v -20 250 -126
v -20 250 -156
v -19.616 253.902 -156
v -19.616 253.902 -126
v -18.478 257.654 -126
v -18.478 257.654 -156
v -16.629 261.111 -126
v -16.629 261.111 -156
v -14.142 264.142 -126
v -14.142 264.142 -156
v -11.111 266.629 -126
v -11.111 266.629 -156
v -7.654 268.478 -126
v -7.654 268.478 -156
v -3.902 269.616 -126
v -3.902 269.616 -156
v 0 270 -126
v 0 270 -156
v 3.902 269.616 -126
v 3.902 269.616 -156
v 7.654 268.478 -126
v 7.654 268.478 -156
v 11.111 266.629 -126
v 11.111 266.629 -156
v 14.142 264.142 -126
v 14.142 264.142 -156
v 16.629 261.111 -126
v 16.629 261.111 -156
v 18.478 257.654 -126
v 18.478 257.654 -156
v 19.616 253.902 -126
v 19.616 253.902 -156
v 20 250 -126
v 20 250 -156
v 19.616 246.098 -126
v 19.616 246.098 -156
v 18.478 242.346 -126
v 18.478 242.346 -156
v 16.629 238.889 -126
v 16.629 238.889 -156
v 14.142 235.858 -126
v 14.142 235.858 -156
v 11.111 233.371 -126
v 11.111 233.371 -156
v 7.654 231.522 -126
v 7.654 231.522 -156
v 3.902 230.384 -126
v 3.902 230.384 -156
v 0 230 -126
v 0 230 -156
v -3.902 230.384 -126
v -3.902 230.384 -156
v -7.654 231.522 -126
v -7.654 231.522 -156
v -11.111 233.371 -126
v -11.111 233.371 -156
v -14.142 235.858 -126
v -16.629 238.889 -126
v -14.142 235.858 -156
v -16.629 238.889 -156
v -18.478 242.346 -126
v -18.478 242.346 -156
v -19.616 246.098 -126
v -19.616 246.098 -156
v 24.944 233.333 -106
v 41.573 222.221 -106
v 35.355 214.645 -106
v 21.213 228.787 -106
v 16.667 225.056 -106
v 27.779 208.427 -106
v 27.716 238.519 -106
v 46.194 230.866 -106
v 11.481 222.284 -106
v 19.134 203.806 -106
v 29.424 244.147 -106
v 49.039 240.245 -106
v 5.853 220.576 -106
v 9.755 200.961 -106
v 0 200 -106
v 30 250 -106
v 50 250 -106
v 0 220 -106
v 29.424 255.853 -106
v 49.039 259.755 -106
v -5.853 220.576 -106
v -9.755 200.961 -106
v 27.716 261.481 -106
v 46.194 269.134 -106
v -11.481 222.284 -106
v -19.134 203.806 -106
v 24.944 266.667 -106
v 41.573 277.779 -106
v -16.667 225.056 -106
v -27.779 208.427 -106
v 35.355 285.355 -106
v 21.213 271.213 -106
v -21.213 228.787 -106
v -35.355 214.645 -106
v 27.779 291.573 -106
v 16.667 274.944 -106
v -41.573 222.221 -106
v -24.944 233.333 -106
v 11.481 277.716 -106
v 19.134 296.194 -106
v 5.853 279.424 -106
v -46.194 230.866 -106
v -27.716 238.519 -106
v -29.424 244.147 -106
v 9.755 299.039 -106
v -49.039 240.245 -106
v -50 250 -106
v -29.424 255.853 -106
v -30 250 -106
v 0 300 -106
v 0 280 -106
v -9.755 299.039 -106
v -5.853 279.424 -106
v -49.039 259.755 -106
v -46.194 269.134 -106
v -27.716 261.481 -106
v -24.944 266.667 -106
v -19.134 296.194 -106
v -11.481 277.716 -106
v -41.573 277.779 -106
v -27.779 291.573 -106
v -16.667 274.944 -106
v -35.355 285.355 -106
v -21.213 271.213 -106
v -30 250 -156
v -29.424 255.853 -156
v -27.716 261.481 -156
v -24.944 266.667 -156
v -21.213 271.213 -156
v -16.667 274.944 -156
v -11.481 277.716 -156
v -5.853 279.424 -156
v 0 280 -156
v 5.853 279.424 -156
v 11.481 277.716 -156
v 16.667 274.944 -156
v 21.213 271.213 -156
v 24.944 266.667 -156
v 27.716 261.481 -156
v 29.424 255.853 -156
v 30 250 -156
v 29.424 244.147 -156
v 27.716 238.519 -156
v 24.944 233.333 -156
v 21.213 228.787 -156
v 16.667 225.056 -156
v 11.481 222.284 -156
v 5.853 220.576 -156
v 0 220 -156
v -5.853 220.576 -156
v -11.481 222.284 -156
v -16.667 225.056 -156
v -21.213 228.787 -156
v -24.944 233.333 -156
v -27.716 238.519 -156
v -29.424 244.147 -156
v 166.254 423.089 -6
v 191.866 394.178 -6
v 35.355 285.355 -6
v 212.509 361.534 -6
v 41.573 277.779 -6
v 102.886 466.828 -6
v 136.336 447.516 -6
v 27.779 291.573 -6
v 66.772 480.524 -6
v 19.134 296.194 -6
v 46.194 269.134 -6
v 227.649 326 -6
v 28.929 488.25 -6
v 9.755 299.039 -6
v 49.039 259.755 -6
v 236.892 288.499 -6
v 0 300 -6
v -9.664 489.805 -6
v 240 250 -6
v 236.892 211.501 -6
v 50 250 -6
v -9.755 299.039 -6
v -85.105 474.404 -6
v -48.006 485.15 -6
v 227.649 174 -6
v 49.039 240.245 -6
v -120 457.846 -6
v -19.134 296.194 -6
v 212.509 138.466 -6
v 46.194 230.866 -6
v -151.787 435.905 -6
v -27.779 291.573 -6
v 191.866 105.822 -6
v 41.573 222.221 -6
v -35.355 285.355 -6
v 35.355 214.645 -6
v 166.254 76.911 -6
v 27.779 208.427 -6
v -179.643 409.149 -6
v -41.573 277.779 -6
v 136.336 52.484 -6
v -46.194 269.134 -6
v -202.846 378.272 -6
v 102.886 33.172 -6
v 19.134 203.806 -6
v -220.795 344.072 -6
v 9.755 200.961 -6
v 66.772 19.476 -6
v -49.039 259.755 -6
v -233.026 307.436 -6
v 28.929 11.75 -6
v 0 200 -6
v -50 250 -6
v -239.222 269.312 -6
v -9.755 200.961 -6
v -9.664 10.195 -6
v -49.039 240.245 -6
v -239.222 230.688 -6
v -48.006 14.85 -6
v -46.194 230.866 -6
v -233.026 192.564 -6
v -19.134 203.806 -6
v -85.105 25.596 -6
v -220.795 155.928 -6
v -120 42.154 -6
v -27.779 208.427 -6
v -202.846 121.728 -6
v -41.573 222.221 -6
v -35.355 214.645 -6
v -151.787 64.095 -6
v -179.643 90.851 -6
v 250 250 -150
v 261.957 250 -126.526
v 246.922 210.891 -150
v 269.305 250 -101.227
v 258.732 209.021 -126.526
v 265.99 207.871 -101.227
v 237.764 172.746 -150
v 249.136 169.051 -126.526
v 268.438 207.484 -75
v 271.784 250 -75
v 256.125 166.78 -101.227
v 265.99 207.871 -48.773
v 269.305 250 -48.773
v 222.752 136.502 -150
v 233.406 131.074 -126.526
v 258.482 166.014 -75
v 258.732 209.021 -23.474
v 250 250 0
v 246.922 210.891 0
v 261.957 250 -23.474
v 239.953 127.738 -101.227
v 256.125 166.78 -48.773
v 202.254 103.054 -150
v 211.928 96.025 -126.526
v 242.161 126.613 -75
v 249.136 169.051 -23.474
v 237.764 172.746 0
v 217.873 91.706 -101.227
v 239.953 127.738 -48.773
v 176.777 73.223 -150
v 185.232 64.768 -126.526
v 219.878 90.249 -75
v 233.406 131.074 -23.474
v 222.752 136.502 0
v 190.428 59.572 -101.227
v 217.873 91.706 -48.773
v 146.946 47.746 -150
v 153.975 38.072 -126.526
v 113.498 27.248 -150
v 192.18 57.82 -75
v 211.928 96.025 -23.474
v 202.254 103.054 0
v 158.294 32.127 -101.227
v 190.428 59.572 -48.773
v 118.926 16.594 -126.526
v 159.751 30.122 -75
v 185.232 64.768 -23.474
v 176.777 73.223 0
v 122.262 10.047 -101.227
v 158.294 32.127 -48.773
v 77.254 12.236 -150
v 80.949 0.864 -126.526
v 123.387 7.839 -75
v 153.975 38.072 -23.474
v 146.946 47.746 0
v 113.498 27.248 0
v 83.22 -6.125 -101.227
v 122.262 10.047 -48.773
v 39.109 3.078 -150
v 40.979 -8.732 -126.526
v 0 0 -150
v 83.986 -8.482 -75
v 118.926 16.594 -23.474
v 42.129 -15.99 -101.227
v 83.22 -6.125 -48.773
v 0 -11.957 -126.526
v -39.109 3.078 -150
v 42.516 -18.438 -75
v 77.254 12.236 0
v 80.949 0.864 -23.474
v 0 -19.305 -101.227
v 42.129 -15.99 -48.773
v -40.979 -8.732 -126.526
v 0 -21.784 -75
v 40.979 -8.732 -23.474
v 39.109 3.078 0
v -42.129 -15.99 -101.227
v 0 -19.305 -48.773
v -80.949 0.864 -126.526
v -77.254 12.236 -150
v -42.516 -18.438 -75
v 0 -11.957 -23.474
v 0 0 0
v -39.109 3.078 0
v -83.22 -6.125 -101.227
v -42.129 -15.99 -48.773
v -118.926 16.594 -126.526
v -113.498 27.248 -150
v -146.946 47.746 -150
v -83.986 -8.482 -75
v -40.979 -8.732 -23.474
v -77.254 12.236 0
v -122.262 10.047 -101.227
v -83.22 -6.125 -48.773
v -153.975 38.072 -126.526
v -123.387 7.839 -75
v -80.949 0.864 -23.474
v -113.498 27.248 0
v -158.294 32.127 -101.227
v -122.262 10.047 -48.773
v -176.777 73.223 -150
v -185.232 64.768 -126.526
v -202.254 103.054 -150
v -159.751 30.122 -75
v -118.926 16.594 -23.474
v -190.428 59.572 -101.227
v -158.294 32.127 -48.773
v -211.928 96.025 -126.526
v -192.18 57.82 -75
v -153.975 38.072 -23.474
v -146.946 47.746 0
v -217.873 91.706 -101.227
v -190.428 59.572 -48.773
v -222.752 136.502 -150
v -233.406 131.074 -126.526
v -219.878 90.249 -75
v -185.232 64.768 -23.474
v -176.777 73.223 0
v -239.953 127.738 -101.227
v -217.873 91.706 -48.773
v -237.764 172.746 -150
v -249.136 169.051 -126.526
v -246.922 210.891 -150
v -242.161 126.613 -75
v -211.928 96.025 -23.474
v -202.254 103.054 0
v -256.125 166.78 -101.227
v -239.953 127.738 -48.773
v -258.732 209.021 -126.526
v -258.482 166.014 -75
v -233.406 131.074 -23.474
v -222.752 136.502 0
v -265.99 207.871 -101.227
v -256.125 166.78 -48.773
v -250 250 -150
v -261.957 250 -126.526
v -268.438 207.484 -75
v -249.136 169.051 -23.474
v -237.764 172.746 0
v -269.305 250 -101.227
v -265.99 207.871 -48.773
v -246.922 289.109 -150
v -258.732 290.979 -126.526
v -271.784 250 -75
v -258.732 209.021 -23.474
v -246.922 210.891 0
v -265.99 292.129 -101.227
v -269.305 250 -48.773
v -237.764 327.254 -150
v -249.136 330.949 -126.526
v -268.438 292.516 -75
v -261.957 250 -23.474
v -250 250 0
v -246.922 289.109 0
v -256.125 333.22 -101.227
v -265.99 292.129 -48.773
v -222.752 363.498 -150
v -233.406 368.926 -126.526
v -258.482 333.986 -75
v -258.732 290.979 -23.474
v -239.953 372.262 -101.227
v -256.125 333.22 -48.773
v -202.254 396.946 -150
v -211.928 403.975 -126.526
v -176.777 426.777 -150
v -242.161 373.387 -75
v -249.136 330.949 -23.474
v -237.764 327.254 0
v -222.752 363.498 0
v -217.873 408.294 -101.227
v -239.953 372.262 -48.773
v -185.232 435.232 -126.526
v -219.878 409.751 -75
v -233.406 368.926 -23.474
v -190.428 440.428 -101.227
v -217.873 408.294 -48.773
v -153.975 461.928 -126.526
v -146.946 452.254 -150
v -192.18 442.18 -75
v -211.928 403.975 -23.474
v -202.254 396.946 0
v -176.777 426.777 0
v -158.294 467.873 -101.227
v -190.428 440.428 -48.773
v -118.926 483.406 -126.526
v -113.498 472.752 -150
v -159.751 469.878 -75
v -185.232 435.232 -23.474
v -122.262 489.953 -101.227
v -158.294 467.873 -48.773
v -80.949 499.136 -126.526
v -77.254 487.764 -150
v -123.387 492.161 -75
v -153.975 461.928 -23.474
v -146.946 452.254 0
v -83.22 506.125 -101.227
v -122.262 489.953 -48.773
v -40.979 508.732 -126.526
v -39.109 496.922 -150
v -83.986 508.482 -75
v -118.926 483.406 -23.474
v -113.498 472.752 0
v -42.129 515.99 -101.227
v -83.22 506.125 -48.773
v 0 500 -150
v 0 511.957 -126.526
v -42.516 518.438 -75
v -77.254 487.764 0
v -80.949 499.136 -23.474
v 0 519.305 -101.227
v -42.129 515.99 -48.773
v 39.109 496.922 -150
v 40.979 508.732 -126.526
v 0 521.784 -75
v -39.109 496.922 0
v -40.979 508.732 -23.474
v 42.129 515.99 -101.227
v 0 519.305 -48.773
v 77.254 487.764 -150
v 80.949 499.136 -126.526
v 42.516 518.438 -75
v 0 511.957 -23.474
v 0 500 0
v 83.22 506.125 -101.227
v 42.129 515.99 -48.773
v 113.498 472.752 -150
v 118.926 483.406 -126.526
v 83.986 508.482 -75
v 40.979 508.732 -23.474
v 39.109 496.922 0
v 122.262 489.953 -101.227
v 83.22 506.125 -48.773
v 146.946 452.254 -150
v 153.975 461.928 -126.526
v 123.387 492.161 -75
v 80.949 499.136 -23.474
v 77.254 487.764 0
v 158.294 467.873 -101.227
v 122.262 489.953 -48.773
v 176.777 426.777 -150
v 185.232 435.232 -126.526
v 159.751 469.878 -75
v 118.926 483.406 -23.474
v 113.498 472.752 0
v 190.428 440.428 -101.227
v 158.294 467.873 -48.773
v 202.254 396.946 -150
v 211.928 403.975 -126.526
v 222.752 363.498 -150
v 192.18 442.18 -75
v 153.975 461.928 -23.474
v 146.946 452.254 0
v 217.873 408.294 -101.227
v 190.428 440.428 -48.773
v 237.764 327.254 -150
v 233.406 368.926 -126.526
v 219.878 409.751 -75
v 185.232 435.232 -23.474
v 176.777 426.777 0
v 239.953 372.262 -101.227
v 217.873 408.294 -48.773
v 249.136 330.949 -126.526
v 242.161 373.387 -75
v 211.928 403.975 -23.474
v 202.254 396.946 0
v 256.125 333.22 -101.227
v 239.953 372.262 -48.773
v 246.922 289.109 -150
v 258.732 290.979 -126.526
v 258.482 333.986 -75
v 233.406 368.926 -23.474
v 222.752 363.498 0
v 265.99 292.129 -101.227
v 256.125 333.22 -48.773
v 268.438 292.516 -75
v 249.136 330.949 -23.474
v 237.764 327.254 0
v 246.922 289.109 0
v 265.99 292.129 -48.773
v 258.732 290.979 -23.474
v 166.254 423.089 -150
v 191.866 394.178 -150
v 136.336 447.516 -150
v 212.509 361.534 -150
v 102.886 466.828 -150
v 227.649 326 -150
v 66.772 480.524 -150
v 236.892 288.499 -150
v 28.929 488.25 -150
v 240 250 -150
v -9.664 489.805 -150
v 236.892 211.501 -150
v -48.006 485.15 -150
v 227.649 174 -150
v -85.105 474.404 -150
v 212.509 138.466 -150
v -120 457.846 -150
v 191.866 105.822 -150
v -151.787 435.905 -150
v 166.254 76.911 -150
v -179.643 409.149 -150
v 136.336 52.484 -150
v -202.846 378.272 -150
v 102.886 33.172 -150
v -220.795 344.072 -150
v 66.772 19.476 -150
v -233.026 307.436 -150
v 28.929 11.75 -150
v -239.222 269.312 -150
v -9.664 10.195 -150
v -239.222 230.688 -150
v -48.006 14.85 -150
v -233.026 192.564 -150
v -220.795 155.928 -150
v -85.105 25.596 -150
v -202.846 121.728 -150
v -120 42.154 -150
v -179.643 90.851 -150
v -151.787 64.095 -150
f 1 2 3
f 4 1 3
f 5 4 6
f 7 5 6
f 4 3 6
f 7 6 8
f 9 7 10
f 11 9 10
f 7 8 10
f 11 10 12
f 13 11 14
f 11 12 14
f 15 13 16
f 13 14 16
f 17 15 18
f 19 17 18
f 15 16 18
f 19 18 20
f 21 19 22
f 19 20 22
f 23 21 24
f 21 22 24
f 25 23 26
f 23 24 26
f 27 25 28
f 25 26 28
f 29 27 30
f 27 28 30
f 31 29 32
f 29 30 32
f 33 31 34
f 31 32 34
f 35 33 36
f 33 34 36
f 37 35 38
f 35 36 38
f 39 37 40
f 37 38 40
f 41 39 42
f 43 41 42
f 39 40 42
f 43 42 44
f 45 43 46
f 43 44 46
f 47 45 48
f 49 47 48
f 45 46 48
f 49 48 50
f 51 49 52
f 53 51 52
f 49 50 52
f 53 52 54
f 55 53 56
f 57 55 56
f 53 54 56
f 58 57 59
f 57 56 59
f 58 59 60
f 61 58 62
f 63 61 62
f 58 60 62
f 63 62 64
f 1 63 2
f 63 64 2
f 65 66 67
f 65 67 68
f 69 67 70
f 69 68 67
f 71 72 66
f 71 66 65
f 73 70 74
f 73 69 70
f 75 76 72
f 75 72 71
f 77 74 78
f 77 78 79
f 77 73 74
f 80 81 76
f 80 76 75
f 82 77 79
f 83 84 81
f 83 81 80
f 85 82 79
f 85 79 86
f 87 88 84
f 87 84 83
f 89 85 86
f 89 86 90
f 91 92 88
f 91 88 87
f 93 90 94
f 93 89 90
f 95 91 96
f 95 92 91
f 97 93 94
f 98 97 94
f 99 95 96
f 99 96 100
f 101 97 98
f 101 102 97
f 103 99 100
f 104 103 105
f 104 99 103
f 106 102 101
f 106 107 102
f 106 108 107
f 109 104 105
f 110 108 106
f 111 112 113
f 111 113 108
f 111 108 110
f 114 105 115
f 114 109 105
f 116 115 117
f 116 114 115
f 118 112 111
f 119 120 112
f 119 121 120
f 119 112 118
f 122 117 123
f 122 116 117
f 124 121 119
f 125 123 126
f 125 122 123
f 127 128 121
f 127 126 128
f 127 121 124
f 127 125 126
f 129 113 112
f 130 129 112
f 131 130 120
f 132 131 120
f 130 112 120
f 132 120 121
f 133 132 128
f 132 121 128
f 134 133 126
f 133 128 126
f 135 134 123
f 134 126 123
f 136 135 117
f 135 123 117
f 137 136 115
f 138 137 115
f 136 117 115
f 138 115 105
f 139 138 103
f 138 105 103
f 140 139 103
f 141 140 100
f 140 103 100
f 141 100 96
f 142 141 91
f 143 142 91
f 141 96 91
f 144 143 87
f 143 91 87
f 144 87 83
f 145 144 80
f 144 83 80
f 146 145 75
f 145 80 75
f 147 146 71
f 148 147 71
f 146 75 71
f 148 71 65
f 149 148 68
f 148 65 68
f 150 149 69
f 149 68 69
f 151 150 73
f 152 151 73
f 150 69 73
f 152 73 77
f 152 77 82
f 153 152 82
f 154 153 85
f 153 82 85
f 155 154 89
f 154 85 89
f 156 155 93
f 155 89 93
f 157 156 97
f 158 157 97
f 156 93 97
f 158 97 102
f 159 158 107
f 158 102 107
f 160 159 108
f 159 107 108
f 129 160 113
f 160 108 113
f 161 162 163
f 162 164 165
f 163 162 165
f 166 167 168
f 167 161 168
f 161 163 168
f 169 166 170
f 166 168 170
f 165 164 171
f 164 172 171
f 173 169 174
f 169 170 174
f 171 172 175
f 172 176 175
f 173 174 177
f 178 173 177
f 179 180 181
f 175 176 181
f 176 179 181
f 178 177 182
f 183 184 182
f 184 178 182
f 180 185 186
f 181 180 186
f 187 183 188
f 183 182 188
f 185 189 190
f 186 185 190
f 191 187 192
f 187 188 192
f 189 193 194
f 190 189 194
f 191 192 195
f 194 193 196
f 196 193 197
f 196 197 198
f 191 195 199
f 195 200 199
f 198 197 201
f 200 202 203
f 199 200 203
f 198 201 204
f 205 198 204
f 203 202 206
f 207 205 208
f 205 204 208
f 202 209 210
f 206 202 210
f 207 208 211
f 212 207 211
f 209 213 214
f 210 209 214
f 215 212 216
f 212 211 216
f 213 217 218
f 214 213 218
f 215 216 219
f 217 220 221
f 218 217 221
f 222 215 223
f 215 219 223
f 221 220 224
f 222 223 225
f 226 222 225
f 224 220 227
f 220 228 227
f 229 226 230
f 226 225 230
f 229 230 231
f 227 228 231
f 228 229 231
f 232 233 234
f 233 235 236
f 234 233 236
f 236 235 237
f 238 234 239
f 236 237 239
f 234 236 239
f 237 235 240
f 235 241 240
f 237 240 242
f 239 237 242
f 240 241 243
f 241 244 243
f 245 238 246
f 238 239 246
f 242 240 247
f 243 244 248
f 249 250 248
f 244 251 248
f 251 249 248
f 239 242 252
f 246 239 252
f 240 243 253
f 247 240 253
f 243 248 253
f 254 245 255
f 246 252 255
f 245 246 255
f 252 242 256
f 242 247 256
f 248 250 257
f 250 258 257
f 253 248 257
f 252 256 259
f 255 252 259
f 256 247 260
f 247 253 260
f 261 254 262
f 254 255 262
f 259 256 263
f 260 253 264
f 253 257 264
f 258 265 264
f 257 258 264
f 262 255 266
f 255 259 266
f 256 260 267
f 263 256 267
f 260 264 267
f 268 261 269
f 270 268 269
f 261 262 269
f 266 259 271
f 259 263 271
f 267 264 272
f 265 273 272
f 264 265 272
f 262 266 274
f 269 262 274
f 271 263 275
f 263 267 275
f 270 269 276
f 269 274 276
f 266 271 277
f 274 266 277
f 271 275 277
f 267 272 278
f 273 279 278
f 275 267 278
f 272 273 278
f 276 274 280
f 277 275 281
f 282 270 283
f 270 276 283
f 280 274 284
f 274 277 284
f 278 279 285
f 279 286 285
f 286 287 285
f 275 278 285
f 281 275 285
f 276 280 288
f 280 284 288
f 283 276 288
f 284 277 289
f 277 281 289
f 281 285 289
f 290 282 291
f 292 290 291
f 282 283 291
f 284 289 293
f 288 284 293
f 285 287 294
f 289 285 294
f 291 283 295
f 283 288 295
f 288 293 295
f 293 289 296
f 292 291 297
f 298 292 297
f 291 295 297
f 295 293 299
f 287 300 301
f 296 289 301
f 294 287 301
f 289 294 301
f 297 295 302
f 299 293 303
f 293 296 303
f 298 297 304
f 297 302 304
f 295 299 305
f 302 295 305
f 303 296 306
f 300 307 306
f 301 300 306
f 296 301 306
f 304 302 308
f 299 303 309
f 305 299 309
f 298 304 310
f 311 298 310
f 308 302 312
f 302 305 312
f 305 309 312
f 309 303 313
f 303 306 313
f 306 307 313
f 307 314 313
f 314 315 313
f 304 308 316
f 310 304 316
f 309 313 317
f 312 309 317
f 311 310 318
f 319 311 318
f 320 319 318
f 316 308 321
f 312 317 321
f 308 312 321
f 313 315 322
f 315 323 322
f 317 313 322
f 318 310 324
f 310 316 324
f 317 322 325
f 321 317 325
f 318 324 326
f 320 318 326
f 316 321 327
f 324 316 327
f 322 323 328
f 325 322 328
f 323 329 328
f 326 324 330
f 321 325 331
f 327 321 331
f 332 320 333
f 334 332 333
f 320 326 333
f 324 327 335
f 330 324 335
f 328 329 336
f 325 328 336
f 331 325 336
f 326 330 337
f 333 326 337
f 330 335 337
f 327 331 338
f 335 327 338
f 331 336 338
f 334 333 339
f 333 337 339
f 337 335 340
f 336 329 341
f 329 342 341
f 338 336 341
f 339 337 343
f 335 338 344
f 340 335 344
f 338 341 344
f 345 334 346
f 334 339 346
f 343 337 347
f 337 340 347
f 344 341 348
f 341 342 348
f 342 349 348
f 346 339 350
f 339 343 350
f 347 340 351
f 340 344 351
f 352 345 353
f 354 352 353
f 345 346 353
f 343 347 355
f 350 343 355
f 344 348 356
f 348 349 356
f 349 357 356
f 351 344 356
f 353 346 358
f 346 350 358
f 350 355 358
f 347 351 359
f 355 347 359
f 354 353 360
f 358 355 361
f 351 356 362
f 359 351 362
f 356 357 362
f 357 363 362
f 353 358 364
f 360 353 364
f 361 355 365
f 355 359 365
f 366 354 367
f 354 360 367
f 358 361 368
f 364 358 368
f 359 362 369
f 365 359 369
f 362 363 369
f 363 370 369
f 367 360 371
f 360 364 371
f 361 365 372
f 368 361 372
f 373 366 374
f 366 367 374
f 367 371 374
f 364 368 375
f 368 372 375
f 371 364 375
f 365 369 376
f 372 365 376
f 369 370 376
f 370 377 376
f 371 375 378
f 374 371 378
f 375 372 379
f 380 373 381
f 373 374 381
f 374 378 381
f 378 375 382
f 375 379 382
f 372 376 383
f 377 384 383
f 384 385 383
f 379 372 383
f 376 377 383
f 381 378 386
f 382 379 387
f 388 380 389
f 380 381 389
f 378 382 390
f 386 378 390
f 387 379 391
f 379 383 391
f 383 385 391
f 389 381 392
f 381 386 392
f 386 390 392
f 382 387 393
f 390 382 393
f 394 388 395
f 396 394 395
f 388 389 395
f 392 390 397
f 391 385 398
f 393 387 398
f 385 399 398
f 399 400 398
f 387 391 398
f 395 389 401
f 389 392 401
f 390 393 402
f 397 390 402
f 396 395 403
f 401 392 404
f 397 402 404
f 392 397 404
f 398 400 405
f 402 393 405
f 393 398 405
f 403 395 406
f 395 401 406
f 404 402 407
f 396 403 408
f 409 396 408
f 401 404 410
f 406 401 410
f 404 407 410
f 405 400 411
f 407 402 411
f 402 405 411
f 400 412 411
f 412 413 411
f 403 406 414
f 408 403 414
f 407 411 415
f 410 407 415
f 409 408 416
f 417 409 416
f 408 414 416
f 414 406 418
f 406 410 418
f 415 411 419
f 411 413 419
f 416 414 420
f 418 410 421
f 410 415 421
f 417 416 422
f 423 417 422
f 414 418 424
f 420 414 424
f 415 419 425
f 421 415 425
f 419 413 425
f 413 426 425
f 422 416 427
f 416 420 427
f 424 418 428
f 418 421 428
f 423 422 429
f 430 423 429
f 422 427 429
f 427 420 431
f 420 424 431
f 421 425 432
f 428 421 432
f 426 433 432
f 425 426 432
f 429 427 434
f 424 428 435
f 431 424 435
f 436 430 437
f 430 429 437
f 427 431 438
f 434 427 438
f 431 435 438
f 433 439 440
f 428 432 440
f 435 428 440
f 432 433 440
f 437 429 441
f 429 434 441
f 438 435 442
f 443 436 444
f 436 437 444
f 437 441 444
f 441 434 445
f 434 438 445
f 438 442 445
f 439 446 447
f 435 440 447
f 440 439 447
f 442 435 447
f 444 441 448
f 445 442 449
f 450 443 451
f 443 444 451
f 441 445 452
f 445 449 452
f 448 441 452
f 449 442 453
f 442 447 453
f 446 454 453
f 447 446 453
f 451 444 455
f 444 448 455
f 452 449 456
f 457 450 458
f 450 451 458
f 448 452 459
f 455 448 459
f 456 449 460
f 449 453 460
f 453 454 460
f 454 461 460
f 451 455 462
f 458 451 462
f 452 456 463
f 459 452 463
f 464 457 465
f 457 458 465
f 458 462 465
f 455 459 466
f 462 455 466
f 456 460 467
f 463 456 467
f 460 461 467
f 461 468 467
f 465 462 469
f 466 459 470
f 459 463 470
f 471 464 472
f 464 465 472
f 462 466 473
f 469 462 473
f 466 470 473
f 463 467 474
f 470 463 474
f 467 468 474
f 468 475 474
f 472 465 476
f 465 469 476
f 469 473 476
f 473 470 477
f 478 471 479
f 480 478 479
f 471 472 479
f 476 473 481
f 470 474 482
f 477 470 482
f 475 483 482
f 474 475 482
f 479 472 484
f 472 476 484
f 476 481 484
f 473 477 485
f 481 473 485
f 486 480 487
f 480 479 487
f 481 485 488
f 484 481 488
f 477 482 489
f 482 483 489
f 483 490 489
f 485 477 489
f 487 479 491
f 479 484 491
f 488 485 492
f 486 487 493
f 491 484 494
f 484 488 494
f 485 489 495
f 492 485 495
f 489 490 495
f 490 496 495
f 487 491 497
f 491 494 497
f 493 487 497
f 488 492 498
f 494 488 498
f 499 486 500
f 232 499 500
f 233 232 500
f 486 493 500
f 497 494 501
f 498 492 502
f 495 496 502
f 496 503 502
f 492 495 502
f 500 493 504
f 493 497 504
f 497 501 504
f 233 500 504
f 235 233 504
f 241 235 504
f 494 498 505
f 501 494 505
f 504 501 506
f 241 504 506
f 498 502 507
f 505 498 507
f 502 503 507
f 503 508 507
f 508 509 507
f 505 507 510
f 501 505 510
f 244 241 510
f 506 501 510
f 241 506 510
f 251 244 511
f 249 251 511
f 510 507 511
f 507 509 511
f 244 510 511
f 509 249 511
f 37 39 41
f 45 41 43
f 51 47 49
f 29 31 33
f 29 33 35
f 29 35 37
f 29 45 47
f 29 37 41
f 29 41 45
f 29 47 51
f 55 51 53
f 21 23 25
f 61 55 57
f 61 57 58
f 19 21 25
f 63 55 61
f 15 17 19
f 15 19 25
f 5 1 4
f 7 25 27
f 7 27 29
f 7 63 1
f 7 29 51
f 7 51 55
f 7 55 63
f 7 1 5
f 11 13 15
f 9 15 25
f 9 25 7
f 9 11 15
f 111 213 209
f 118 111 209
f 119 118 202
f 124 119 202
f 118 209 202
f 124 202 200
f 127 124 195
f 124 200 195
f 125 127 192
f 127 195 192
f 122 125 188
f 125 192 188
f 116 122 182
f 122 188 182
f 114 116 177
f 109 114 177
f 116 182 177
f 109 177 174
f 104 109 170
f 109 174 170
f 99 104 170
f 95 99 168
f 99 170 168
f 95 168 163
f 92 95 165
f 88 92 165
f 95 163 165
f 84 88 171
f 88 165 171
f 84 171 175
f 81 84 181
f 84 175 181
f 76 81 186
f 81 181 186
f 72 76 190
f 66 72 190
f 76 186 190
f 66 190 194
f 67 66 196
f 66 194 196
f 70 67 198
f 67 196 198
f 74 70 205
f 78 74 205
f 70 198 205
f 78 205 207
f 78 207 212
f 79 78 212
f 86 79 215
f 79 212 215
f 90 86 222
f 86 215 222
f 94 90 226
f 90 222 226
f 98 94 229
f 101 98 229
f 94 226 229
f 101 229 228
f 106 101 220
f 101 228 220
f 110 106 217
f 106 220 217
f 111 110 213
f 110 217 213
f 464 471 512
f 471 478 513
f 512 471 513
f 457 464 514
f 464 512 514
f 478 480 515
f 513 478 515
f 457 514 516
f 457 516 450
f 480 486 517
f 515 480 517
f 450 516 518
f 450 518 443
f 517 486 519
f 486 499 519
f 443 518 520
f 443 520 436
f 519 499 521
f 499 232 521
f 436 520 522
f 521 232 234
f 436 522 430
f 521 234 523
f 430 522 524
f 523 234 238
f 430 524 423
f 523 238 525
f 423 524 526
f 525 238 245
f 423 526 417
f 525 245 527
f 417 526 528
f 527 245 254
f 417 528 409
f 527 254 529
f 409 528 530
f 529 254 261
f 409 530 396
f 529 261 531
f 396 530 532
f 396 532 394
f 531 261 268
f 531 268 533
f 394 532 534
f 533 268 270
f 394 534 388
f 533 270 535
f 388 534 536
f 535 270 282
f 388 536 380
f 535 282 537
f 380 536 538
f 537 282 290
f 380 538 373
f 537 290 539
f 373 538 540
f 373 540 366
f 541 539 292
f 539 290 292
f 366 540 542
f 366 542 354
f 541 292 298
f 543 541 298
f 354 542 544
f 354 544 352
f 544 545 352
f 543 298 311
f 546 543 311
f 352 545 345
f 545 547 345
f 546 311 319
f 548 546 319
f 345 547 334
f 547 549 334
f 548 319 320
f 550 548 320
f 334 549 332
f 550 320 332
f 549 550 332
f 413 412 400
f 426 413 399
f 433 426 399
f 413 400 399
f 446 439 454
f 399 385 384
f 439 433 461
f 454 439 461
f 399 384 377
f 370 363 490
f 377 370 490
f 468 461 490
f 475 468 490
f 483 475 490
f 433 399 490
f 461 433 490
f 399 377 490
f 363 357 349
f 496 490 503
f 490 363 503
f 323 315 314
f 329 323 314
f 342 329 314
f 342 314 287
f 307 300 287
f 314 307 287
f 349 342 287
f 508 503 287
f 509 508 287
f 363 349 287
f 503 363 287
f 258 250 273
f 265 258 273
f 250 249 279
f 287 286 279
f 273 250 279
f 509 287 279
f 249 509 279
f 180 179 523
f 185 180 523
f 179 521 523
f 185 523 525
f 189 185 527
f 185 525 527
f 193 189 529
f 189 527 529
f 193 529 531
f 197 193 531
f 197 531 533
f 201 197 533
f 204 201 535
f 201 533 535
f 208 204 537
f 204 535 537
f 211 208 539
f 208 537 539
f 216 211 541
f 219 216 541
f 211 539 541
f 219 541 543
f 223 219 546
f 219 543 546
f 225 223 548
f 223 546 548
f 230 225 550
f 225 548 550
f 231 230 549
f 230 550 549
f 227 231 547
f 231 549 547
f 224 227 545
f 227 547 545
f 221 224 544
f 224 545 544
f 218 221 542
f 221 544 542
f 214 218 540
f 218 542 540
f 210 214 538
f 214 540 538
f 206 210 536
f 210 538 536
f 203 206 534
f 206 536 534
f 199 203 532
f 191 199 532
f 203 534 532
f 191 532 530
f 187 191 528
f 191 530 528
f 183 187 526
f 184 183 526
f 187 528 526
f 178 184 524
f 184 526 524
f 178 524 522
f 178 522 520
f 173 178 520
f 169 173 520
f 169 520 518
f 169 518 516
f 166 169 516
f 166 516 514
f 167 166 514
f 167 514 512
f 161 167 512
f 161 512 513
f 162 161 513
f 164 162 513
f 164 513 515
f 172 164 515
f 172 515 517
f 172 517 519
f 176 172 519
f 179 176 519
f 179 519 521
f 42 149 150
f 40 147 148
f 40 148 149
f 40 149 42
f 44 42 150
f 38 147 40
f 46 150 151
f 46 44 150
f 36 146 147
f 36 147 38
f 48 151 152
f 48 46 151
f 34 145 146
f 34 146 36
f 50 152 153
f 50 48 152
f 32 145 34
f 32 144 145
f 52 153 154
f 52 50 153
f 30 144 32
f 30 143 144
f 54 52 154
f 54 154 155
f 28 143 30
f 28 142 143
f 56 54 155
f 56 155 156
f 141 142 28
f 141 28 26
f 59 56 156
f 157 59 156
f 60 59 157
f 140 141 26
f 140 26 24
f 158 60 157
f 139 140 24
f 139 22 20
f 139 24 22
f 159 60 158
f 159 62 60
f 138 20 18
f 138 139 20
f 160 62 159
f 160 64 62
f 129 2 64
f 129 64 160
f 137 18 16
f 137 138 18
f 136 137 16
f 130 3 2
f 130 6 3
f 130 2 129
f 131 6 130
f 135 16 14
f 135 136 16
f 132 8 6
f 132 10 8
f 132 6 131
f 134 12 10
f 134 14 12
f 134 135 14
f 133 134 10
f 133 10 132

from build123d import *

# Parameters (mm, degrees)
SKETCH2_R           = 50
BOSS_EXTRUDE1_DEPTH = 100
SKETCH3_R           = 30
BOSS_EXTRUDE2_DEPTH = 50
SKETCH4_R           = 20
CUT_EXTRUDE1_DEPTH  = 30


with BuildPart() as part:
    # Sketch1 → Revolve1 (revolve)
    with BuildSketch(Plane(origin=(0, 0, 0), x_dir=(0, 0, -1), z_dir=(1, 0, 0)), mode=Mode.PRIVATE) as revolve1_sk:
        with BuildLine():
            Line((0, 0), (0, 10))
            Line((0, 10), (0, 250))
            Line((0, 250), (6, 250))
            Line((6, 250), (6, 10))
            Line((6, 10), (150, 10))
            Line((150, 10), (150, 0))
            ThreePointArc((150, 0), (75, -21.784095825), (0, 0))
        make_face()
    revolve(revolve1_sk.sketch.rotate(Axis((0, 250, 0), (0, 0, -1)), 270), axis=Axis((0, 250, 0), (0, 0, -1)))

    # Sketch2 → Boss-Extrude1 (add)
    with BuildSketch(Plane(origin=(0, 0, -6), x_dir=(-1, 0, 0), z_dir=(0, 0, -1))):
        with Locations((0, 250)):
            Circle(SKETCH2_R)
    extrude(amount=BOSS_EXTRUDE1_DEPTH)

    # Sketch3 → Boss-Extrude2 (add)
    with BuildSketch(Plane(origin=(0, 0, -106), x_dir=(-1, 0, 0), z_dir=(0, 0, -1))):
        with Locations((0, 250)):
            Circle(SKETCH3_R)
    extrude(amount=BOSS_EXTRUDE2_DEPTH)

    # Sketch4 → Cut-Extrude1 (cut)
    with BuildSketch(Plane(origin=(0, 0, -156), x_dir=(-1, 0, 0), z_dir=(0, 0, -1))):
        with Locations((0, 250)):
            Circle(SKETCH4_R)
    extrude(amount=-CUT_EXTRUDE1_DEPTH, mode=Mode.SUBTRACT)


solid = part.part
